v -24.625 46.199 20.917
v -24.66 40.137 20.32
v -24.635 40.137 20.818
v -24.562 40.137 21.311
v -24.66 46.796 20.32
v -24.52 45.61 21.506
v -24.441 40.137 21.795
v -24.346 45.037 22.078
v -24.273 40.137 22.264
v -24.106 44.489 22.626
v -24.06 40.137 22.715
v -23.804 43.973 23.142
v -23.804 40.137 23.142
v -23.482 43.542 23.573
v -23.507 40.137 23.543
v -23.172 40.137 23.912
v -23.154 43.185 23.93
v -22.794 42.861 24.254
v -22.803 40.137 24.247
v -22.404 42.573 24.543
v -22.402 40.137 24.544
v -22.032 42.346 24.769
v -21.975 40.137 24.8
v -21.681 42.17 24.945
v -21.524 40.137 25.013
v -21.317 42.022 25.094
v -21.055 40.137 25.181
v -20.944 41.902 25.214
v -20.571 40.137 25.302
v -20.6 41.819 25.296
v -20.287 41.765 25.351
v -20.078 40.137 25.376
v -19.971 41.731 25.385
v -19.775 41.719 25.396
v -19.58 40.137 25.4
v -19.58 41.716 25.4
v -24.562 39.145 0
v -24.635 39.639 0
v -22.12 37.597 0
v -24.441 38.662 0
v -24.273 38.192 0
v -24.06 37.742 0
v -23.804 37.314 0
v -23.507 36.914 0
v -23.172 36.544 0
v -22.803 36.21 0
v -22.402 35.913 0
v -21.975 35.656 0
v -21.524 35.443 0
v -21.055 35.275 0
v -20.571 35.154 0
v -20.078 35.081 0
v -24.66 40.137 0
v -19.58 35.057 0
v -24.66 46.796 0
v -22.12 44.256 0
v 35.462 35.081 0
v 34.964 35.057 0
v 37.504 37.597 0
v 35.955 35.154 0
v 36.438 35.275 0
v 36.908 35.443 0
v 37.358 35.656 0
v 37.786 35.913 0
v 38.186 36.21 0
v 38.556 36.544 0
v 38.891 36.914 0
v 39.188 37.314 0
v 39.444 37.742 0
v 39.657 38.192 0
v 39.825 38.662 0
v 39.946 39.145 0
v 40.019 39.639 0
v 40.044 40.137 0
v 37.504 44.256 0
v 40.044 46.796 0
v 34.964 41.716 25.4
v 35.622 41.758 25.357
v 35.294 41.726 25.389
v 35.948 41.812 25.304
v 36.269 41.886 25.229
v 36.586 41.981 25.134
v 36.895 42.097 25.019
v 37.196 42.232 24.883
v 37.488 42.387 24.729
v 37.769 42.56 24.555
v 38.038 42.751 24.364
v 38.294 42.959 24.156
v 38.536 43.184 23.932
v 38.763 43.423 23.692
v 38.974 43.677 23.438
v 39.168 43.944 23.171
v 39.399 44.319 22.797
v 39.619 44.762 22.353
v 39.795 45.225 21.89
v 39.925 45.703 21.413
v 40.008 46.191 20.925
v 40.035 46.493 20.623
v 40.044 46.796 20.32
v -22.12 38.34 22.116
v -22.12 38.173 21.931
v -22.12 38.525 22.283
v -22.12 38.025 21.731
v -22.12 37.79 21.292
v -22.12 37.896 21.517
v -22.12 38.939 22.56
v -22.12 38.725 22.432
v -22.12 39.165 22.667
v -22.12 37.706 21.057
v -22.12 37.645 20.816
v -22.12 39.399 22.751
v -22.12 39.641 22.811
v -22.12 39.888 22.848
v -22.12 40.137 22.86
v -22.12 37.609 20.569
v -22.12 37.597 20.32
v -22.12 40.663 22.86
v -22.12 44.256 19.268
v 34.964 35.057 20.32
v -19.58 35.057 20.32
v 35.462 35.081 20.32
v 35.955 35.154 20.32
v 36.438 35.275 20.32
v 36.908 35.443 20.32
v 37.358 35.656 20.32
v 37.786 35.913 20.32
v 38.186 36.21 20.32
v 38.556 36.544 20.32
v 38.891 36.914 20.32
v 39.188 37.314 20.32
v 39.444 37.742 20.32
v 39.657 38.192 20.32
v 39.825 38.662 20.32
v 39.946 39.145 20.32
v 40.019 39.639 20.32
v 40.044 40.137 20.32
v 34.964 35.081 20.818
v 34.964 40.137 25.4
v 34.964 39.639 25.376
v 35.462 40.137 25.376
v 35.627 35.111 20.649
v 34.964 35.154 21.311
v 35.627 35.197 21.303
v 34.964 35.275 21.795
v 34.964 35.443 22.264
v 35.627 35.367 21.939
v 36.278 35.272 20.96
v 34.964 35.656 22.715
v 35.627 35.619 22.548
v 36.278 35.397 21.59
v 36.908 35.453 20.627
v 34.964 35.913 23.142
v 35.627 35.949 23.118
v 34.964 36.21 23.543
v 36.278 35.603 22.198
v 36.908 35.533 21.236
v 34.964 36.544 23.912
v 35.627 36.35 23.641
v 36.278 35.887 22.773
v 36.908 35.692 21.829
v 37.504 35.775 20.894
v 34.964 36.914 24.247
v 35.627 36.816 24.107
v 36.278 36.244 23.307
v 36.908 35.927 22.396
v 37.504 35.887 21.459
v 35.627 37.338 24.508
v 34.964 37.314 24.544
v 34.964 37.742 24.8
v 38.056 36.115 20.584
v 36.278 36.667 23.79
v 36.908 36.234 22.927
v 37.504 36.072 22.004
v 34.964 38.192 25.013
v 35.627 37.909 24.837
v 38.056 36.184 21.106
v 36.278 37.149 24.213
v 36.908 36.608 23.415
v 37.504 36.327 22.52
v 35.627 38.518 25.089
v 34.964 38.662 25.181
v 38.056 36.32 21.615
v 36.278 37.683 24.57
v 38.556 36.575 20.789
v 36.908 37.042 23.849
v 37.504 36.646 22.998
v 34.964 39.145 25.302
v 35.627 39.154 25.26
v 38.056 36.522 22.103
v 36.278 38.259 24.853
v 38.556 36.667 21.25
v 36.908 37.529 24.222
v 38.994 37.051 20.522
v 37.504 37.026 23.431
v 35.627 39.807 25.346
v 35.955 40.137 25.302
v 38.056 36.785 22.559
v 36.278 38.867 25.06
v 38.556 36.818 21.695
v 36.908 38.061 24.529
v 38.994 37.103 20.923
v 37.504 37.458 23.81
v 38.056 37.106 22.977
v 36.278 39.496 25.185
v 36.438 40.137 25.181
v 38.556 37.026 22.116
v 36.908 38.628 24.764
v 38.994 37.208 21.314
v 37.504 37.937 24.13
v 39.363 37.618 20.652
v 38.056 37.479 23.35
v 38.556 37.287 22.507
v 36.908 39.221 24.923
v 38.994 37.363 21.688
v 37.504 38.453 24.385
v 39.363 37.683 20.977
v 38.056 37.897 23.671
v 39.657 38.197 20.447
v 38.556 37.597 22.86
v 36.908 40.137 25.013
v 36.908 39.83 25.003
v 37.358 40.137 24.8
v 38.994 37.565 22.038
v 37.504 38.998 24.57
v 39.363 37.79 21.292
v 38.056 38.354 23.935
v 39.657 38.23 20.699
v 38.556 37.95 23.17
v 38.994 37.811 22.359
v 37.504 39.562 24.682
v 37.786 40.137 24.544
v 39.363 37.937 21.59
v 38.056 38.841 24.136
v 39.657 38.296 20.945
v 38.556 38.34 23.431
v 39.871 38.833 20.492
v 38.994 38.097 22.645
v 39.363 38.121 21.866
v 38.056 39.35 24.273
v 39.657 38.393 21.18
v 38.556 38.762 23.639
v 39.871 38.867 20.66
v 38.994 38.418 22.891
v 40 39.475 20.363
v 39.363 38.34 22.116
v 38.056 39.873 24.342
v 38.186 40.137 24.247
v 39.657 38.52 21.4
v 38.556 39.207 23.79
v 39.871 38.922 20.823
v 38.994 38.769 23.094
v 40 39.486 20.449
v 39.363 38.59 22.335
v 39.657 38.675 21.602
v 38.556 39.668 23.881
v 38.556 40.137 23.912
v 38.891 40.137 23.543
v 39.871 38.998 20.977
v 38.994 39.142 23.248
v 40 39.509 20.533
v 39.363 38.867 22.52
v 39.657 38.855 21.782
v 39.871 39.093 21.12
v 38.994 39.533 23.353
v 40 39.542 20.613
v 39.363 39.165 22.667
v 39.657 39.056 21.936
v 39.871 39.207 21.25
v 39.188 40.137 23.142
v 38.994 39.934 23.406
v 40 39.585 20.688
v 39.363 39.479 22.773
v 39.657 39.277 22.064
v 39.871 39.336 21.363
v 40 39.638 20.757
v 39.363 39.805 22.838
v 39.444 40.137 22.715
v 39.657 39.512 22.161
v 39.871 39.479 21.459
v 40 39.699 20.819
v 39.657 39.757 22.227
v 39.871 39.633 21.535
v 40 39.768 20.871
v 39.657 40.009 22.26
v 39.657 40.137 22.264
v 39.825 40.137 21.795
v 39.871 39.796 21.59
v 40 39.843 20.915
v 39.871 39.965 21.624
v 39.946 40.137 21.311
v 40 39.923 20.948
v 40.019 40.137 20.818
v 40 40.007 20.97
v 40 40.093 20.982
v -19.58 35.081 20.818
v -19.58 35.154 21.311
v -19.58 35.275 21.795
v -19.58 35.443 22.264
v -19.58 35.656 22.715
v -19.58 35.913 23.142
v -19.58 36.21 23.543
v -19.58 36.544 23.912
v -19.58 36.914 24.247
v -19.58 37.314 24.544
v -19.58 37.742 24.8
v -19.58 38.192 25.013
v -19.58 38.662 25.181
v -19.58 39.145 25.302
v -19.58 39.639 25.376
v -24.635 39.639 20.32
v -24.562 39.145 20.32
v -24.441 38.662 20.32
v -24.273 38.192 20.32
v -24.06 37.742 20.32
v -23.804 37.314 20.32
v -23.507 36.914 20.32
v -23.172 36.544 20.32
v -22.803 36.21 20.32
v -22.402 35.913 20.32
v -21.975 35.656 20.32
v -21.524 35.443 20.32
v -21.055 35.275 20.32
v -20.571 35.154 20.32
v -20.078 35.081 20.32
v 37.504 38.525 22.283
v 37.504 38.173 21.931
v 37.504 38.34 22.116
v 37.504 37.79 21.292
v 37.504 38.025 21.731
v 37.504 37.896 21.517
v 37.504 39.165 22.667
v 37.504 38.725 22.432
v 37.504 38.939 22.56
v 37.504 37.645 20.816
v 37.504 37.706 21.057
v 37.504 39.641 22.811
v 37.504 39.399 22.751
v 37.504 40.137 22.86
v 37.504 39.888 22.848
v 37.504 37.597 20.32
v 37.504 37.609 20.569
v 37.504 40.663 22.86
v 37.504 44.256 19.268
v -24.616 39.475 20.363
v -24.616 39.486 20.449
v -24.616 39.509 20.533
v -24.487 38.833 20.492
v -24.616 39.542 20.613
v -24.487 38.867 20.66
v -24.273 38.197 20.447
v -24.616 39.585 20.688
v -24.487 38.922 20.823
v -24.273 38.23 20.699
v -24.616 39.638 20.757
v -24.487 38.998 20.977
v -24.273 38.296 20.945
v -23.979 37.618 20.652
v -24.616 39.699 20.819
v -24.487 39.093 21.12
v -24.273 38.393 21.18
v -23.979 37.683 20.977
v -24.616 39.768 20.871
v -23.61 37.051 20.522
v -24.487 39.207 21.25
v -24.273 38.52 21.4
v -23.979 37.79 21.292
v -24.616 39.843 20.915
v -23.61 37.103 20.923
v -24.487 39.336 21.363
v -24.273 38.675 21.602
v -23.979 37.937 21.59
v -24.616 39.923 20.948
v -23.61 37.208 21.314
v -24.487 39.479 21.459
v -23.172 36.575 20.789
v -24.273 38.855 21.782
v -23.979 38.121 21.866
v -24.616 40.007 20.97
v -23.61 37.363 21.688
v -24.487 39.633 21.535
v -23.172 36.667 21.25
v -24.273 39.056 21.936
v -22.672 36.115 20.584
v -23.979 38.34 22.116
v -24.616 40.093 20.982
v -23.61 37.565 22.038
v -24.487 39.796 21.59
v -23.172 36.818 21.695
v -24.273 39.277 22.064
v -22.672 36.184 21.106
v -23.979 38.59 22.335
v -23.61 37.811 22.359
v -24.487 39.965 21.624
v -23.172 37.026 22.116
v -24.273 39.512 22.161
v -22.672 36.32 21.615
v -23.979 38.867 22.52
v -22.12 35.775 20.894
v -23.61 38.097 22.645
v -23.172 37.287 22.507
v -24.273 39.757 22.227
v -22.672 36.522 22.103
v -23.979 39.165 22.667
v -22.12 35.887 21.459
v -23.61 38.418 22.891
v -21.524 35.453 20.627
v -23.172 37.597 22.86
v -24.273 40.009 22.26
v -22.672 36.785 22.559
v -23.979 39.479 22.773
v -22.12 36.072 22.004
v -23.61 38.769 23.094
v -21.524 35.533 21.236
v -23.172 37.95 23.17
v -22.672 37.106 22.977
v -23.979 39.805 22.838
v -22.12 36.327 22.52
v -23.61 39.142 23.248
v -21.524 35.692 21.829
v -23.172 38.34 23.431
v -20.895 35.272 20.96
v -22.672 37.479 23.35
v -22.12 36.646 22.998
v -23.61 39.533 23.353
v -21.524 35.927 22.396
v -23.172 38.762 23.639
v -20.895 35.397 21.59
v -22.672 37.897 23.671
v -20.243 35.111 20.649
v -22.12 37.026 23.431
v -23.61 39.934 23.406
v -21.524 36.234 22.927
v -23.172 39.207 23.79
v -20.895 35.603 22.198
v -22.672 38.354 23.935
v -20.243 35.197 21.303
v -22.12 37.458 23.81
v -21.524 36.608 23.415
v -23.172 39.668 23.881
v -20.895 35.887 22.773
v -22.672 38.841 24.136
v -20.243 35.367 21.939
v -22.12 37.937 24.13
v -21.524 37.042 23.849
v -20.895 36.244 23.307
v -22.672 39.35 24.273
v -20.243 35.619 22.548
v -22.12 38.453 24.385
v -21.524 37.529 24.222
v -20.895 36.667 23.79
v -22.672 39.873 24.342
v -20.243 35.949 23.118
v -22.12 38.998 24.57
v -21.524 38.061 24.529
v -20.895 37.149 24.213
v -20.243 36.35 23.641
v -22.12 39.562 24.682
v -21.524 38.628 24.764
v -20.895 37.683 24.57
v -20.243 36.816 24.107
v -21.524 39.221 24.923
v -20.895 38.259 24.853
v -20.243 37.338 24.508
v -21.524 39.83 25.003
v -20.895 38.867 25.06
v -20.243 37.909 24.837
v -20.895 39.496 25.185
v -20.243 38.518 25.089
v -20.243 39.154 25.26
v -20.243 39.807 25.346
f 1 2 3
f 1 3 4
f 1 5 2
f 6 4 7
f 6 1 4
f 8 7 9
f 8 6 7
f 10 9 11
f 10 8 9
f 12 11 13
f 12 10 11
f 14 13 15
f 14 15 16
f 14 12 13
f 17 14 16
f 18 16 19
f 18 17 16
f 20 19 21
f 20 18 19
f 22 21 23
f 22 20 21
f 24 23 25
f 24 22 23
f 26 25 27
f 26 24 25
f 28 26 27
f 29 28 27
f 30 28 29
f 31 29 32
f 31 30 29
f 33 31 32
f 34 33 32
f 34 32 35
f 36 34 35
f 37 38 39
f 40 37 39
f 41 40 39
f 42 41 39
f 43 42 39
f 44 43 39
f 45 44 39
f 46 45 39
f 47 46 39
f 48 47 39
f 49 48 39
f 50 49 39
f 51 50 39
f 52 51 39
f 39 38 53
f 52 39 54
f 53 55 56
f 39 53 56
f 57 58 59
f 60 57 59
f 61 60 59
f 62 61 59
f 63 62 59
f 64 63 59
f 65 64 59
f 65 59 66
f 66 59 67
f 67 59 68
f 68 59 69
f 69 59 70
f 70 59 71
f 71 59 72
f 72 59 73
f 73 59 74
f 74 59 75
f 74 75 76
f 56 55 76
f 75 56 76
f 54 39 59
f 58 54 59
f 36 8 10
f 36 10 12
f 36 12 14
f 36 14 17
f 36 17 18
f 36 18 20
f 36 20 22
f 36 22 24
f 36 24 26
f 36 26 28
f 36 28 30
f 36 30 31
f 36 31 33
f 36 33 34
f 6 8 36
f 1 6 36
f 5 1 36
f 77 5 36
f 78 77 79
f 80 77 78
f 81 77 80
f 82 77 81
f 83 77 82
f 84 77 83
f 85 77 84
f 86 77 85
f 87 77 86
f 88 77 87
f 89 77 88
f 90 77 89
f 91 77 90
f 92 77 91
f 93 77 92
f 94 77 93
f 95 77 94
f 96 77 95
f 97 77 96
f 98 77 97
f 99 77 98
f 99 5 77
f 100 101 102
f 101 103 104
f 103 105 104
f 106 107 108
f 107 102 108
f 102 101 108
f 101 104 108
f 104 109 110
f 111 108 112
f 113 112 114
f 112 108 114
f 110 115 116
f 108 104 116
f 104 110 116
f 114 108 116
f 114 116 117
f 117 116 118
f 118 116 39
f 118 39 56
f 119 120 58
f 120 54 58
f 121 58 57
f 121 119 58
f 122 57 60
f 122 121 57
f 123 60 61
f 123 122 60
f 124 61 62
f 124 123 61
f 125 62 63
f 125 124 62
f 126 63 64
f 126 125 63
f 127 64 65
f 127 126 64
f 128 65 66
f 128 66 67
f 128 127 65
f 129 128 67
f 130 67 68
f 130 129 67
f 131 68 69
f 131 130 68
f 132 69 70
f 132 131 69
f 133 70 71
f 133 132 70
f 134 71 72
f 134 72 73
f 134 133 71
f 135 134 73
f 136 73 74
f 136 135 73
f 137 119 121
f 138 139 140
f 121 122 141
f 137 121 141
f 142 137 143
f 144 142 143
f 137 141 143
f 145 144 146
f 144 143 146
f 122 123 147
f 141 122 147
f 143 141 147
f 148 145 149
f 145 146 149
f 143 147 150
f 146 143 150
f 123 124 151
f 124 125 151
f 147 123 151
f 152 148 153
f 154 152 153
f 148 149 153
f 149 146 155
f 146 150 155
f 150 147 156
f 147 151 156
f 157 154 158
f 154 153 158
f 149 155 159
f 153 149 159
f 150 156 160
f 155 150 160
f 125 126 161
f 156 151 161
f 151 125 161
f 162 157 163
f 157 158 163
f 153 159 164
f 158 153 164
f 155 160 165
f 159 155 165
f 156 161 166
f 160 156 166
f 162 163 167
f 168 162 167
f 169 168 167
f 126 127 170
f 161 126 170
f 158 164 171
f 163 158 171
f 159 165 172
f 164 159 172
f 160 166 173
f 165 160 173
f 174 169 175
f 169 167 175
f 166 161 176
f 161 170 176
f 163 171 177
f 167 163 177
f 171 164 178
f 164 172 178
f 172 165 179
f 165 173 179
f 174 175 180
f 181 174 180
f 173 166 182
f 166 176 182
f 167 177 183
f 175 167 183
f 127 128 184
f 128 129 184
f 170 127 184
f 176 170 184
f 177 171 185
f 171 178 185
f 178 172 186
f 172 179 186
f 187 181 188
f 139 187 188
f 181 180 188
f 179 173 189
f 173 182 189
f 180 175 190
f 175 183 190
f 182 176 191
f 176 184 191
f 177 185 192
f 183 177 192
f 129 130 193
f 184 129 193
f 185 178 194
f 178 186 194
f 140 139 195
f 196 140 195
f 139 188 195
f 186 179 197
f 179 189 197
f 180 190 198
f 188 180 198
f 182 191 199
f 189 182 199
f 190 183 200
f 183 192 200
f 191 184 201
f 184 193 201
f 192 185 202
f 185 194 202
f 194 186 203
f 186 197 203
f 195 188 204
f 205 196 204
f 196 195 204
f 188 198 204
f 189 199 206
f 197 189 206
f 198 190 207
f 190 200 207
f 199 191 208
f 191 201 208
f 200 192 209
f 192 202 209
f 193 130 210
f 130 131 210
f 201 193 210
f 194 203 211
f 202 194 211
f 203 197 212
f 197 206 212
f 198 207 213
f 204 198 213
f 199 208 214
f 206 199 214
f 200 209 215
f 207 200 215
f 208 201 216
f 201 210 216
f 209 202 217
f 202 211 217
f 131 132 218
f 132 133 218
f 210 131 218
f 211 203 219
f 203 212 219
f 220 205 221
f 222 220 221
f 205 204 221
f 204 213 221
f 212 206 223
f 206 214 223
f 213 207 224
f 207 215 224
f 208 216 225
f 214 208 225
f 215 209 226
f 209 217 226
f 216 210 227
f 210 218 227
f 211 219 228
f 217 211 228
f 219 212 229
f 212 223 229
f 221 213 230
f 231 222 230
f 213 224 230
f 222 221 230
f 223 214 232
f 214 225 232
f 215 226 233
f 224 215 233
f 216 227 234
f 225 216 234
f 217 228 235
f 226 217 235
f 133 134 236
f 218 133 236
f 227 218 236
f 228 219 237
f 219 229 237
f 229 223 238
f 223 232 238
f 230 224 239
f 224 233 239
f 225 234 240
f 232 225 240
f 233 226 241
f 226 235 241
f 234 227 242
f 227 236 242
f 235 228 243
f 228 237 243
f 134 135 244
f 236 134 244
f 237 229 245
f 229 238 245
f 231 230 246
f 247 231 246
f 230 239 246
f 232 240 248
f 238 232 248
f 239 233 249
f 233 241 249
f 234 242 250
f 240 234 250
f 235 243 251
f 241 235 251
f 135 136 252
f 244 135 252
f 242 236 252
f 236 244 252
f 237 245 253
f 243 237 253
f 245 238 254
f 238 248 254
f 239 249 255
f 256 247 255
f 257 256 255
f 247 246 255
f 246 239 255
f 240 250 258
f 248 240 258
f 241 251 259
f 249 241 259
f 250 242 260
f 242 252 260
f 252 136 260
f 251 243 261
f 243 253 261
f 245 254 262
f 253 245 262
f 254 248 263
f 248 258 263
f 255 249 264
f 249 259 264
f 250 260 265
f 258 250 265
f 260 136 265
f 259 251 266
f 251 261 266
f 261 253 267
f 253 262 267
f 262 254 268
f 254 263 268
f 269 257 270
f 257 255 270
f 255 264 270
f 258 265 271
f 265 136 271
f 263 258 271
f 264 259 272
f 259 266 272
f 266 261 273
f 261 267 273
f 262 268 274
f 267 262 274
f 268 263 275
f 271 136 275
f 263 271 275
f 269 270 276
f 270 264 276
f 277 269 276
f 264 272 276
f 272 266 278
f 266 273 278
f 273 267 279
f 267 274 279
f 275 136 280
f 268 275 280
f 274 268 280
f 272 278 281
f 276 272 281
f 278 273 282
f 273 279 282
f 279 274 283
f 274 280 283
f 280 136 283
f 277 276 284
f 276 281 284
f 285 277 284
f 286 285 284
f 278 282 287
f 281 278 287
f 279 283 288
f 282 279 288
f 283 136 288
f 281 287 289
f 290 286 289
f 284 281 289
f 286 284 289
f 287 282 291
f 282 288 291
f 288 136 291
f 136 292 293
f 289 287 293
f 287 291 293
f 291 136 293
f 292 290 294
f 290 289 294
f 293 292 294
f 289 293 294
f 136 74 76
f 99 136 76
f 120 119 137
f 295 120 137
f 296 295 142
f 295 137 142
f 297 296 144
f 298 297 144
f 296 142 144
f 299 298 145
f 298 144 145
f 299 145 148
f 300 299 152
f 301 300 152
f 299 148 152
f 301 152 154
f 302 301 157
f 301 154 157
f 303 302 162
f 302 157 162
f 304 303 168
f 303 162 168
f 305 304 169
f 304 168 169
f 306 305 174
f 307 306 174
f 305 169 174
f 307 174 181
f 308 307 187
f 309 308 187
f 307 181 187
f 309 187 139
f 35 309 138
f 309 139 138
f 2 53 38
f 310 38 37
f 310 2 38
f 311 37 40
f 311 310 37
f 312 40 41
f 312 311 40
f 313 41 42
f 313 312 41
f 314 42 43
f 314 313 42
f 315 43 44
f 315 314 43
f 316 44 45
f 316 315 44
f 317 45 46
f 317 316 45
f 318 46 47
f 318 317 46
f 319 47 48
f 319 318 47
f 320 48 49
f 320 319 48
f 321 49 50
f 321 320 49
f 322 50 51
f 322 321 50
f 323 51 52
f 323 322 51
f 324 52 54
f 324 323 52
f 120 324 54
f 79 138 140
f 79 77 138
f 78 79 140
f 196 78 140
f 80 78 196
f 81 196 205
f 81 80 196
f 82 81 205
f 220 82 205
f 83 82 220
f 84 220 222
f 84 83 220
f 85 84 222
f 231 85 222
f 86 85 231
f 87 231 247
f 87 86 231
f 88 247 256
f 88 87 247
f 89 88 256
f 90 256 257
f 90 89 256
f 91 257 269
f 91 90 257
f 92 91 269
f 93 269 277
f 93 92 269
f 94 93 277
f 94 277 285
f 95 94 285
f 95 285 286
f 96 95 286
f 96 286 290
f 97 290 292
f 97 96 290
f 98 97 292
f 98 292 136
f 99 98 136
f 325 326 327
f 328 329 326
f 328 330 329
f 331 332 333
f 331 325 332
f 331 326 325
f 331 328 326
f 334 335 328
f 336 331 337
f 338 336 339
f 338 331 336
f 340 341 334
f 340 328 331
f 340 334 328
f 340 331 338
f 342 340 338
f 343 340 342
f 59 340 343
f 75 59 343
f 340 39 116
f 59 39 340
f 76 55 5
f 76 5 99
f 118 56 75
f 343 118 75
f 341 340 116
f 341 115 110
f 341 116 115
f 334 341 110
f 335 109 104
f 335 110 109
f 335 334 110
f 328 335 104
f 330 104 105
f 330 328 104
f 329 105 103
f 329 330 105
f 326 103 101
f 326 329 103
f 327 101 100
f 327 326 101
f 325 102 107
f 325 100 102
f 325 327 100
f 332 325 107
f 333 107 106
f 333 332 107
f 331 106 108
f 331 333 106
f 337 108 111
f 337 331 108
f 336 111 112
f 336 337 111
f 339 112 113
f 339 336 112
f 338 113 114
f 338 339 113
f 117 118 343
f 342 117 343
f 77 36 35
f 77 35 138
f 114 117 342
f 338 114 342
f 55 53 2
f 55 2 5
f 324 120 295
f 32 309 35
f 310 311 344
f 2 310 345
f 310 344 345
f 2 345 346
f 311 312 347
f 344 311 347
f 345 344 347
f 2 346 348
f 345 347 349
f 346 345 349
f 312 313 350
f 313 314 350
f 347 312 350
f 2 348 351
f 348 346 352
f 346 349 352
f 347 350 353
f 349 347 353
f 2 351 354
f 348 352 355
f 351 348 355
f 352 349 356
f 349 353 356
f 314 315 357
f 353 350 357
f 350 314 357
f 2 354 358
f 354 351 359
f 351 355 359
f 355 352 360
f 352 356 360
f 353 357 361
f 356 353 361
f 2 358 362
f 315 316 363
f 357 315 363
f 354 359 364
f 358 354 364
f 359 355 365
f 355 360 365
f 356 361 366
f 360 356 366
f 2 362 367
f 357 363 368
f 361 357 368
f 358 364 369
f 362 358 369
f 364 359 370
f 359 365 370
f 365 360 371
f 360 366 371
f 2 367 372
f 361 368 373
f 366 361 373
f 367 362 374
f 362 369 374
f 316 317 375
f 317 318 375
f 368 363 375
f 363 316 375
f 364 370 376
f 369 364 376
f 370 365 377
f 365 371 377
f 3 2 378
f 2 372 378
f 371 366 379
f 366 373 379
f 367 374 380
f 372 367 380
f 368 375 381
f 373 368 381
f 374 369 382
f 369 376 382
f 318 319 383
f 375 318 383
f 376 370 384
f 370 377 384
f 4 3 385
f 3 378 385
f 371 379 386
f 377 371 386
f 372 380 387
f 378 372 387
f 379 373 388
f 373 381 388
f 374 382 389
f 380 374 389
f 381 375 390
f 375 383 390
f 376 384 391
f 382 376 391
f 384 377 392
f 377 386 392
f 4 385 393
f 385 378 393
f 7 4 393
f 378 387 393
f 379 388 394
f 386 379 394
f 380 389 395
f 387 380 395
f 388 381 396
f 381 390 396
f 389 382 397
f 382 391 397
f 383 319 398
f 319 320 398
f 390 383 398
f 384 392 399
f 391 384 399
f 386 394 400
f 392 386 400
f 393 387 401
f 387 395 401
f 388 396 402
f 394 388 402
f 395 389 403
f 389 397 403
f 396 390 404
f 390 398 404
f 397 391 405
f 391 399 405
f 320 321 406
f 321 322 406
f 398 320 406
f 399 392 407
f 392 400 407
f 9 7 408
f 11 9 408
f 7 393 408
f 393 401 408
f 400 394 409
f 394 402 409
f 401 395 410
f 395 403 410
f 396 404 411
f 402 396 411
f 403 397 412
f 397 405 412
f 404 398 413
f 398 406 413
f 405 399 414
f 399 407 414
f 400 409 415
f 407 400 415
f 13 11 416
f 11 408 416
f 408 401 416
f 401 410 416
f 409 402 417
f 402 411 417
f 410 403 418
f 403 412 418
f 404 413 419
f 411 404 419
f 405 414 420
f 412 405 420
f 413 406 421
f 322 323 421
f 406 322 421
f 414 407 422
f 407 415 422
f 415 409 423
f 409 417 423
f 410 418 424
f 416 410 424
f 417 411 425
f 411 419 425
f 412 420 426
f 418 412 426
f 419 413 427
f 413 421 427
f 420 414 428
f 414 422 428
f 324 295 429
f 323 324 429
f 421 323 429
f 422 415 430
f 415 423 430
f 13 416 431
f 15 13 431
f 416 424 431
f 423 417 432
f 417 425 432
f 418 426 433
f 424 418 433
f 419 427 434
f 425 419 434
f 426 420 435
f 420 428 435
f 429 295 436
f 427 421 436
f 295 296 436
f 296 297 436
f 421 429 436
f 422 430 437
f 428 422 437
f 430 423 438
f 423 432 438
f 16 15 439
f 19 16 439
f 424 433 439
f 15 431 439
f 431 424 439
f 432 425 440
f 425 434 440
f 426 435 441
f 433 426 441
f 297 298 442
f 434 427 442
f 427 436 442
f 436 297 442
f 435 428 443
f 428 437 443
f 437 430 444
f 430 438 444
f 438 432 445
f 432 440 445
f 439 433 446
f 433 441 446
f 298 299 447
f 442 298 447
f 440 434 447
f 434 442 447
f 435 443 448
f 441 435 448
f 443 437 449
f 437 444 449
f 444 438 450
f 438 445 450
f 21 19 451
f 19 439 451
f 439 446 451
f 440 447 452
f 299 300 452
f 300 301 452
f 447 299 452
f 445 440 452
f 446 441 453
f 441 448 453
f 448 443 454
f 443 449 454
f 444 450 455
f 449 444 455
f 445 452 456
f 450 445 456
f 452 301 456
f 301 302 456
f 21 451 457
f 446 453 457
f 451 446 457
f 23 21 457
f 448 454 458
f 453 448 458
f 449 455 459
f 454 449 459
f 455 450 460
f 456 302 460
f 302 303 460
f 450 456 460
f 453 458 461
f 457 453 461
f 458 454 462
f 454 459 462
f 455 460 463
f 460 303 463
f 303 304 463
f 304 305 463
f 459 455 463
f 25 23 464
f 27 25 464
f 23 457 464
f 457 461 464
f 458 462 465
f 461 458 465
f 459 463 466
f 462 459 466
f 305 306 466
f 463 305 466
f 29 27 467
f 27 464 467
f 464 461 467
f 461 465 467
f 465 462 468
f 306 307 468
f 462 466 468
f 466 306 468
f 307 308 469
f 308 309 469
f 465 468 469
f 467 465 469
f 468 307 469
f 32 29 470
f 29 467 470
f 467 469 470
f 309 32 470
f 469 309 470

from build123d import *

# Parameters (mm, degrees)
F0_W     = 64.703614
F0_H     = 11.739045
F1_DEPTH = 25.4
F2_R     = 5.08
F3_SIZE  = 5.08
F4_T     = -2.54
F5_R     = 5.08


with BuildPart() as f1:
    # F0 (on Top) → F1 (new body)
    with BuildSketch(Plane.XY):
        with Locations((7.69186, 40.92604)):
            Rectangle(F0_W, F0_H)
    extrude(amount=F1_DEPTH)

    # F2
    f2_edges = [f1.edges().sort_by_distance(p)[0] for p in [
        (7.69186, 35.056517, 25.4),
    ]]
    fillet(f2_edges, radius=F2_R)

    # F3
    f3_edges = [f1.edges().sort_by_distance(p)[0] for p in [
        (7.69186, 46.795562, 25.4),
    ]]
    chamfer(f3_edges, length=F3_SIZE)

    # F4
    f4_openings = [f1.faces().sort_by_distance(p)[0] for p in [
        (7.69186, 40.926039, 0),
    ]]
    offset(amount=F4_T, openings=f4_openings)

    # F5
    f5_edges = [f1.edges().sort_by_distance(p)[0] for p in [
        (40.043667, 35.056517, 10.16),
        (-24.659947, 35.056517, 10.16),
    ]]
    fillet(f5_edges, radius=F5_R)


solid = f1.part
